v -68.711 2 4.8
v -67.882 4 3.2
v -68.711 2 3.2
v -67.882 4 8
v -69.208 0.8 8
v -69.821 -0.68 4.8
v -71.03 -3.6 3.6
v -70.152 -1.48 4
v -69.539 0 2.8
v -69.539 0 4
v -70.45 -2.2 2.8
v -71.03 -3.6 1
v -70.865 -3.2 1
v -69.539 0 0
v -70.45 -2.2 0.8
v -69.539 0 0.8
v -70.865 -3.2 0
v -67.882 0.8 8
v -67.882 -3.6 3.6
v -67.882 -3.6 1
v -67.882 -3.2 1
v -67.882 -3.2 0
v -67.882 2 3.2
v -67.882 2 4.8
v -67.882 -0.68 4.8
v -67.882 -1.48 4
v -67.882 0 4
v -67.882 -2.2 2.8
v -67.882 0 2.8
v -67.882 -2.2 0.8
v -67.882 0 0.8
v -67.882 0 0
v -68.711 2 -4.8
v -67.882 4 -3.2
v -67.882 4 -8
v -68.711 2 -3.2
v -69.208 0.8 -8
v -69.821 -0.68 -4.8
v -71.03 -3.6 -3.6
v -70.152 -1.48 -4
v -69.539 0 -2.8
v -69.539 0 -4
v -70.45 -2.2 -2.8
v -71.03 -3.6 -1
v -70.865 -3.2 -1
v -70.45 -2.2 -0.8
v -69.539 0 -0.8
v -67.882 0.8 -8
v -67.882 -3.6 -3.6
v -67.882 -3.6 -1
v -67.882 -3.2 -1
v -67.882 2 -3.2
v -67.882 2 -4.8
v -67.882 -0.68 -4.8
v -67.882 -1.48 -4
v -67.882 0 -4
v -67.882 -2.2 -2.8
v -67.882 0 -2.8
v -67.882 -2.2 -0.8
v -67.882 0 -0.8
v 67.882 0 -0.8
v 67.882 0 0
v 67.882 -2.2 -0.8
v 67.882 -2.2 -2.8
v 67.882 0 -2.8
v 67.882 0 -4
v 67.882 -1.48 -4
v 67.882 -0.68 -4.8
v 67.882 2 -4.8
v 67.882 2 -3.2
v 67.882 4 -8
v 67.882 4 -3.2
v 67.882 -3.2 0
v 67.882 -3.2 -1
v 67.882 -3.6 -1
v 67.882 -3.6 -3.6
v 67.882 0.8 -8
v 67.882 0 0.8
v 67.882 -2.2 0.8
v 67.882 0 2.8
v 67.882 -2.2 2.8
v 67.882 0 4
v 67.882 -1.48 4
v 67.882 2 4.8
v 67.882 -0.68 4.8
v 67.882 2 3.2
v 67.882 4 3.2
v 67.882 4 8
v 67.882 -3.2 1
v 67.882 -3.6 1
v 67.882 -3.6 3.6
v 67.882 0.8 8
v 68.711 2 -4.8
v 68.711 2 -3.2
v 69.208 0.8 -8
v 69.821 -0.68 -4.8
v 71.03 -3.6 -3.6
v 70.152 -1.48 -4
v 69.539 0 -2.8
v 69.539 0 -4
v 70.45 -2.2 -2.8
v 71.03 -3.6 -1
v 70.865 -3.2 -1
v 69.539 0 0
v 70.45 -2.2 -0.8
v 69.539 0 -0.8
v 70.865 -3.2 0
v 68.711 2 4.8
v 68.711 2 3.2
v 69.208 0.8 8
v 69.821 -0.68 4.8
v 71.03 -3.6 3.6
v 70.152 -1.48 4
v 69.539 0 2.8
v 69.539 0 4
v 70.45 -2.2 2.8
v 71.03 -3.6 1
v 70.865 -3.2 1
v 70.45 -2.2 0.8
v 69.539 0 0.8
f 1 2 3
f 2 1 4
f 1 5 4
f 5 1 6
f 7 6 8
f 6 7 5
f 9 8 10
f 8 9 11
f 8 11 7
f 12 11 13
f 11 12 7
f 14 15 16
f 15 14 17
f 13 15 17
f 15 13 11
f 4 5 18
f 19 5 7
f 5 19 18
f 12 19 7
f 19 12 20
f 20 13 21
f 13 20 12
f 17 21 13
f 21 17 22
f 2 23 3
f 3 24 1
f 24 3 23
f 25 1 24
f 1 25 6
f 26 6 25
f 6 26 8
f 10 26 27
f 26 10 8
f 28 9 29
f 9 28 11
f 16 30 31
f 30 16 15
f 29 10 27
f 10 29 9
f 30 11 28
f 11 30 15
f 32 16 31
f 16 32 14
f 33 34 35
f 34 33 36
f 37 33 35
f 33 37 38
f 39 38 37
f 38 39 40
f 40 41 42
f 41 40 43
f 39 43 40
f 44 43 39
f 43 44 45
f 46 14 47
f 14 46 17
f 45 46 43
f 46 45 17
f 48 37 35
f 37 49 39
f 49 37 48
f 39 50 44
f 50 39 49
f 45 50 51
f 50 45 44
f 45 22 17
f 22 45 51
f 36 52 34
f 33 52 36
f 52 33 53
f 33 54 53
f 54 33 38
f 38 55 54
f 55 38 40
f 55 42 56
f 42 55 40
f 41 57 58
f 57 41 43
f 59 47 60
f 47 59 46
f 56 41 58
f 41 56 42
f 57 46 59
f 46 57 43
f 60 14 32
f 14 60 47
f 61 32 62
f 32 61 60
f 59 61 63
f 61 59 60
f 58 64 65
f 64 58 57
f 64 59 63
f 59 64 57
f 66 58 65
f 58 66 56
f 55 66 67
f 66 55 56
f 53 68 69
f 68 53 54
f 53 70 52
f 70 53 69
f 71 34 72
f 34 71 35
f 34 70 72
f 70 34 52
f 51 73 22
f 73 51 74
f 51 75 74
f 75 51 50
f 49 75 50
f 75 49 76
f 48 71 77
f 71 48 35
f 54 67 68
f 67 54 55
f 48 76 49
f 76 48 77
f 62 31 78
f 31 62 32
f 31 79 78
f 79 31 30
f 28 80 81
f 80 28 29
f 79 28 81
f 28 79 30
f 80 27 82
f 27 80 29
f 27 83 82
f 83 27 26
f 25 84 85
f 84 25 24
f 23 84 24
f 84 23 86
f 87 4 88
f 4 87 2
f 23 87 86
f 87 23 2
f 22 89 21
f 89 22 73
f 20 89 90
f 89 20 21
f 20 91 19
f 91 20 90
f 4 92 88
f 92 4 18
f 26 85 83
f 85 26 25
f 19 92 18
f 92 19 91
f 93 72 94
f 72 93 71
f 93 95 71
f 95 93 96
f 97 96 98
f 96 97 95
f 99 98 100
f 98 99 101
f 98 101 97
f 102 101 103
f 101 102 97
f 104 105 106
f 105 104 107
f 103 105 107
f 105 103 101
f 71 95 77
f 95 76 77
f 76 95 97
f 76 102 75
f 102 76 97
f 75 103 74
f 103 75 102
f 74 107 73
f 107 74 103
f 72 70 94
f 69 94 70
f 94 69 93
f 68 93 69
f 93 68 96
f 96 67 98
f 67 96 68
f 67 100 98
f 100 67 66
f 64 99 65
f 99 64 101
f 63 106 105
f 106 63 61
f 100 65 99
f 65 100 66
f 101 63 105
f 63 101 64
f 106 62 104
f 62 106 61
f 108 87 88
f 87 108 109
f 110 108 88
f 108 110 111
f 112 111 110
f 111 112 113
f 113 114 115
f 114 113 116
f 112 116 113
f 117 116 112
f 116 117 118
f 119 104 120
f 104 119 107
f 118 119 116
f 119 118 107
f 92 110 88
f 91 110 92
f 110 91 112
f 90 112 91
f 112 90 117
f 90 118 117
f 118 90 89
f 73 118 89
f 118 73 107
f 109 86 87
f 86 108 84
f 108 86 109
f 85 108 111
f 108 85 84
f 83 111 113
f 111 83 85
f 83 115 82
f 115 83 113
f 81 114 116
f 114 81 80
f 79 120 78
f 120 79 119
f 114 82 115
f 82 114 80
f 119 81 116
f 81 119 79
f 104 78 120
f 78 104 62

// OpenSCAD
// file: ../p/rect2p.scad
use <../lib.scad>
function ldraw_lib__rect2p() = [
// 0 Rectangle with 2 Parallel Edges
// 0 Name: rect2p.dat
// 0 Author: Donald Sutter [technog]
// 0 !LDRAW_ORG Primitive UPDATE 2010-01
// 0 !LICENSE Licensed under CC BY 2.0 and CC BY 4.0 : see CAreadme.txt
// 
// 0 BFC CERTIFY CCW
  [0,"BFC","CERTIFY"],
  [0,"BFC","CCW"],
// 
// 0 !HISTORY 2003-08-01 [PTadmin] Official Update 2003-02
// 0 !HISTORY 2007-06-24 [PTadmin] Header formatted for Contributor Agreement
// 0 !HISTORY 2008-07-01 [PTadmin] Official Update 2008-01
// 0 !HISTORY 2010-01-17 [mikeheide] changed winding to CCW
// 0 !HISTORY 2010-04-05 [PTadmin] Official Update 2010-01
// 
// 
// 2 24 1 0 1 -1 0 1
  [2,24,1,0,1,-1,0,1],
// 2 24 -1 0 -1 1 0 -1
  [2,24,-1,0,-1,1,0,-1],
// 4 16 -1 0 1 -1 0 -1 1 0 -1 1 0 1
  [4,16,-1,0,1,-1,0,-1,1,0,-1,1,0,1],
// 0
];
module ldraw_lib__rect2p(step=0, col=false, unit=2/5, alt=false, line=0.2, solid=!$preview)
    makepoly(ldraw_lib__rect2p(), step=step, col=col, unit=unit, alt=alt, line=line, solid=solid);
ldraw_lib__rect2p(line=0.2);
// file: ../p/rect1.scad
use <../lib.scad>
function ldraw_lib__rect1() = [
// 0 Rectangle with 1 Edge
// 0 Name: rect1.dat
// 0 Author: Chris Dee [cwdee]
// 0 !LDRAW_ORG Primitive UPDATE 2010-01
// 0 !LICENSE Licensed under CC BY 2.0 and CC BY 4.0 : see CAreadme.txt
// 
// 0 BFC CERTIFY CCW
  [0,"BFC","CERTIFY"],
  [0,"BFC","CCW"],
// 
// 0 !HISTORY 2003-12-19 [PTadmin] Official Update 2003-03
// 0 !HISTORY 2007-06-24 [PTadmin] Header formatted for Contributor Agreement
// 0 !HISTORY 2008-07-01 [PTadmin] Official Update 2008-01
// 0 !HISTORY 2010-01-17 [mikeheide] changed winding to CCW
// 0 !HISTORY 2010-04-05 [PTadmin] Official Update 2010-01
// 
// 
// 2 24 1 0 -1 1 0 1
  [2,24,1,0,-1,1,0,1],
// 4 16 -1 0 1 -1 0 -1 1 0 -1 1 0 1
  [4,16,-1,0,1,-1,0,-1,1,0,-1,1,0,1],
// 0
];
module ldraw_lib__rect1(step=0, col=false, unit=2/5, alt=false, line=0.2, solid=!$preview)
    makepoly(ldraw_lib__rect1(), step=step, col=col, unit=unit, alt=alt, line=line, solid=solid);
ldraw_lib__rect1(line=0.2);
// file: ../p/box2-9p.scad
use <../lib.scad>
function ldraw_lib__box2_9p() = [
// 0 Box with 2 Faces with 3 Parallel Edges
// 0 Name: box2-9p.dat
// 0 Author: Ronald Vallenduuk [Duq]
// 0 !LDRAW_ORG Primitive UPDATE 2013-02
// 0 !LICENSE Licensed under CC BY 2.0 and CC BY 4.0 : see CAreadme.txt
// 
// 0 BFC CERTIFY CCW
  [0,"BFC","CERTIFY"],
  [0,"BFC","CCW"],
// 
// 0 !HISTORY 2013-12-23 [PTadmin] Official Update 2013-02
// 
// 
// 2 24 1 1 1 -1 1 1
  [2,24,1,1,1,-1,1,1],
// 2 24 1 -1 1 -1 -1 1
  [2,24,1,-1,1,-1,-1,1],
// 2 24 1 1 -1 -1 1 -1
  [2,24,1,1,-1,-1,1,-1],
// 4 16 1 1 1 1 1 -1 -1 1 -1 -1 1 1
  [4,16,1,1,1,1,1,-1,-1,1,-1,-1,1,1],
// 4 16 1 1 1 -1 1 1 -1 -1 1 1 -1 1
  [4,16,1,1,1,-1,1,1,-1,-1,1,1,-1,1],
];
module ldraw_lib__box2_9p(step=0, col=false, unit=2/5, alt=false, line=0.2, solid=!$preview)
    makepoly(ldraw_lib__box2_9p(), step=step, col=col, unit=unit, alt=alt, line=line, solid=solid);
ldraw_lib__box2_9p(line=0.2);
// file: ../p/box2-11.scad
use <../lib.scad>
function ldraw_lib__box2_11() = [
// 0 Box with 2 Faces without 11 Edges
// 0 Name: box2-11.dat
// 0 Author: Steffen [Steffen]
// 0 !LDRAW_ORG Primitive UPDATE 2005-01
// 0 !LICENSE Licensed under CC BY 2.0 and CC BY 4.0 : see CAreadme.txt
// 
// 0 BFC CERTIFY CCW
  [0,"BFC","CERTIFY"],
  [0,"BFC","CCW"],
// 
// 0 !HISTORY 2005-12-28 [PTadmin] Official Update 2005-01
// 0 !HISTORY 2007-06-24 [PTadmin] Header formatted for Contributor Agreement
// 0 !HISTORY 2008-07-01 [PTadmin] Official Update 2008-01
// 
// 
// 2 24 1 1 1 -1 1 1
  [2,24,1,1,1,-1,1,1],
// 4 16 1 1 1 1 1 -1 -1 1 -1 -1 1 1
  [4,16,1,1,1,1,1,-1,-1,1,-1,-1,1,1],
// 4 16 1 1 1 -1 1 1 -1 -1 1 1 -1 1
  [4,16,1,1,1,-1,1,1,-1,-1,1,1,-1,1],
// 0
];
module ldraw_lib__box2_11(step=0, col=false, unit=2/5, alt=false, line=0.2, solid=!$preview)
    makepoly(ldraw_lib__box2_11(), step=step, col=col, unit=unit, alt=alt, line=line, solid=solid);
ldraw_lib__box2_11(line=0.2);
// file: ../p/rect3.scad
use <../lib.scad>
function ldraw_lib__rect3() = [
// 0 Rectangle with 3 Edges
// 0 Name: rect3.dat
// 0 Author: Mark Kennedy [mkennedy]
// 0 !LDRAW_ORG Primitive UPDATE 2010-01
// 0 !LICENSE Licensed under CC BY 2.0 and CC BY 4.0 : see CAreadme.txt
// 
// 0 BFC CERTIFY CCW
  [0,"BFC","CERTIFY"],
  [0,"BFC","CCW"],
// 
// 0 !HISTORY 2003-08-01 [PTadmin] Official Update 2003-02
// 0 !HISTORY 2007-06-24 [PTadmin] Header formatted for Contributor Agreement
// 0 !HISTORY 2008-07-01 [PTadmin] Official Update 2008-01
// 0 !HISTORY 2010-01-17 [mikeheide] Change winding to CCW
// 0 !HISTORY 2010-04-05 [PTadmin] Official Update 2010-01
// 
// 
// 2 24 1 0 1 -1 0 1
  [2,24,1,0,1,-1,0,1],
// 2 24 1 0 1 1 0 -1
  [2,24,1,0,1,1,0,-1],
// 2 24 -1 0 1 -1 0 -1
  [2,24,-1,0,1,-1,0,-1],
// 4 16 -1 0 1 -1 0 -1 1 0 -1 1 0 1
  [4,16,-1,0,1,-1,0,-1,1,0,-1,1,0,1],
// 0 //
];
module ldraw_lib__rect3(step=0, col=false, unit=2/5, alt=false, line=0.2, solid=!$preview)
    makepoly(ldraw_lib__rect3(), step=step, col=col, unit=unit, alt=alt, line=line, solid=solid);
ldraw_lib__rect3(line=0.2);
// file: ../p/rect2a.scad
use <../lib.scad>
function ldraw_lib__rect2a() = [
// 0 Rectangle with 2 Adjacent Edges
// 0 Name: rect2a.dat
// 0 Author: Chris Dee [cwdee]
// 0 !LDRAW_ORG Primitive UPDATE 2010-01
// 0 !LICENSE Licensed under CC BY 2.0 and CC BY 4.0 : see CAreadme.txt
// 
// 0 BFC CERTIFY CCW
  [0,"BFC","CERTIFY"],
  [0,"BFC","CCW"],
// 
// 0 !HISTORY 2003-12-19 [PTadmin] Official Update 2003-03
// 0 !HISTORY 2007-06-24 [PTadmin] Header formatted for Contributor Agreement
// 0 !HISTORY 2008-07-01 [PTadmin] Official Update 2008-01
// 0 !HISTORY 2010-01-17 [mikeheide] changed winding to CCW
// 0 !HISTORY 2010-04-05 [PTadmin] Official Update 2010-01
// 
// 
// 2 24 1 0 1 -1 0 1
  [2,24,1,0,1,-1,0,1],
// 2 24 1 0 -1 1 0 1
  [2,24,1,0,-1,1,0,1],
// 4 16 -1 0 1 -1 0 -1 1 0 -1 1 0 1
  [4,16,-1,0,1,-1,0,-1,1,0,-1,1,0,1],
// 0
];
module ldraw_lib__rect2a(step=0, col=false, unit=2/5, alt=false, line=0.2, solid=!$preview)
    makepoly(ldraw_lib__rect2a(), step=step, col=col, unit=unit, alt=alt, line=line, solid=solid);
ldraw_lib__rect2a(line=0.2);
// file: s/48202s02.scad
use <../../lib.scad>
use <../../p/box2-11.scad>
use <../../p/box2-9p.scad>
use <../../p/rect1.scad>
use <../../p/rect2p.scad>
function ldraw_lib__s__48202s02() = [
// 0 ~Technic Bumper Section
// 0 Name: s\48202s02.dat
// 0 Author: Marc Giraudet [Mad_Marc]
// 0 !LDRAW_ORG Subpart UPDATE 2020-01
// 0 !LICENSE Licensed under CC BY 2.0 and CC BY 4.0 : see CAreadme.txt
// 
// 0 BFC CERTIFY CCW
  [0,"BFC","CERTIFY"],
  [0,"BFC","CCW"],
// 
// 0 !HISTORY 2020-06-28 [PTadmin] Official Update 2020-01
// 
// 
// 1 16 1 -1 -2.75 1 0 0 0 0 -1 0 2.75 0 box2-11.dat
  [1,16,1,-1,-2.75,1,0,0,0,0,-1,0,2.75,0, ldraw_lib__box2_11()],
// 0 BFC INVERTNEXT
  [0,"BFC","INVERTNEXT"],
// 1 16 1 -4.5 -2.75 1 0 0 0 -2.5 0 0 0 -2.75 box2-9p.dat
  [1,16,1,-4.5,-2.75,1,0,0,0,-2.5,0,0,0,-2.75, ldraw_lib__box2_9p()],
// 1 16 1 -8.5 -1.85 1 0 0 0 0 -1.5 0 1.85 0 box2-11.dat
  [1,16,1,-8.5,-1.85,1,0,0,0,0,-1.5,0,1.85,0, ldraw_lib__box2_11()],
// 0 BFC INVERTNEXT
  [0,"BFC","INVERTNEXT"],
// 1 16 1 -10 1.65 -1 0 0 0 -2 0 0 0 3.35 box2-9p.dat
  [1,16,1,-10,1.65,-1,0,0,0,-2,0,0,0,3.35, ldraw_lib__box2_9p()],
// 1 16 1 -14 7.5 -1 0 0 0 0 6 0 2.5 0 box2-11.dat
  [1,16,1,-14,7.5,-1,0,0,0,0,6,0,2.5,0, ldraw_lib__box2_11()],
// 0 BFC INVERTNEXT
  [0,"BFC","INVERTNEXT"],
// 1 16 1 -1.25 -8.5 1 0 0 0 0 -1.25 0 0.5 0 box2-11.dat
  [1,16,1,-1.25,-8.5,1,0,0,0,0,-1.25,0,0.5,0, ldraw_lib__box2_11()],
// 1 16 1 -5.75 -9 1 0 0 0 0 -3.25 0 1 0 rect2p.dat
  [1,16,1,-5.75,-9,1,0,0,0,0,-3.25,0,1,0, ldraw_lib__rect2p()],
// 1 16 1 -20 6 1 0 0 0 1 0 0 0 4 rect2p.dat
  [1,16,1,-20,6,1,0,0,0,1,0,0,0,4, ldraw_lib__rect2p()],
// 1 16 1 -11 -2.7 0 0 -1 0.9998 -0.7071 0 -0.9998 -0.7071 0 rect1.dat
  [1,16,1,-11,-2.7,0,0,-1,0.9998,-0.7071,0,-0.9998,-0.7071,0, ldraw_lib__rect1()],
// 4 16 0 -20 2 0 -9 -9 2 -9 -9 2 -20 2
  [4,16,0,-20,2,0,-9,-9,2,-9,-9,2,-20,2],
];
module ldraw_lib__s__48202s02(step=0, col=false, unit=2/5, alt=false, line=0.2, solid=!$preview)
    makepoly(ldraw_lib__s__48202s02(), step=step, col=col, unit=unit, alt=alt, line=line, solid=solid);
ldraw_lib__s__48202s02(line=0.2);
// file: s/48202s01.scad
use <../../lib.scad>
use <../../p/rect2a.scad>
use <../../p/rect3.scad>
function ldraw_lib__s__48202s01() = [
// 0 ~Technic Bumper End
// 0 Name: s\48202s01.dat
// 0 Author: Marc Giraudet [Mad_Marc]
// 0 !LDRAW_ORG Subpart UPDATE 2020-01
// 0 !LICENSE Licensed under CC BY 2.0 and CC BY 4.0 : see CAreadme.txt
// 
// 0 BFC CERTIFY CCW
  [0,"BFC","CERTIFY"],
  [0,"BFC","CCW"],
// 
// 0 !HISTORY 2020-06-28 [PTadmin] Official Update 2020-01
// 
// 
// 4 16 0 -20 10 0 -8 10 -2.071 -8 5 -2.071 -12 5
  [4,16,0,-20,10,0,-8,10,-2.071,-8,5,-2.071,-12,5],
// 4 16 -2.071 -12 5 -4.846 -12 -1.7 -3.314 -20 2 0 -20 10
  [4,16,-2.071,-12,5,-4.846,-12,-1.7,-3.314,-20,2,0,-20,10],
// 4 16 -3.314 -20 2 -4.846 -12 -1.7 -5.675 -10 -3.7 -7.87 -9 -9
  [4,16,-3.314,-20,2,-4.846,-12,-1.7,-5.675,-10,-3.7,-7.87,-9,-9],
// 4 16 -5.675 -10 -3.7 -4.142 -10 0 -4.142 -7 0 -6.42 -7 -5.5
  [4,16,-5.675,-10,-3.7,-4.142,-10,0,-4.142,-7,0,-6.42,-7,-5.5],
// 3 16 -5.675 -10 -3.7 -6.42 -7 -5.5 -7.87 -9 -9
  [3,16,-5.675,-10,-3.7,-6.42,-7,-5.5,-7.87,-9,-9],
// 4 16 -7.87 -9 -9 -6.42 -7 -5.5 -7.456 -2.5 -8 -7.87 -2.5 -9
  [4,16,-7.87,-9,-9,-6.42,-7,-5.5,-7.456,-2.5,-8,-7.87,-2.5,-9],
// 4 16 -4.142 -2 0 -4.142 0 0 -7.456 0 -8 -6.42 -2 -5.5
  [4,16,-4.142,-2,0,-4.142,0,0,-7.456,0,-8,-6.42,-2,-5.5],
// 4 16 -6.42 -7 -5.5 -6.42 -2 -5.5 -7.456 0 -8 -7.456 -2.5 -8
  [4,16,-6.42,-7,-5.5,-6.42,-2,-5.5,-7.456,0,-8,-7.456,-2.5,-8],
// 2 24 0 -20 10 -3.314 -20 2
  [2,24,0,-20,10,-3.314,-20,2],
// 2 24 -3.314 -20 2 -7.87 -9 -9
  [2,24,-3.314,-20,2,-7.87,-9,-9],
// 2 24 -7.87 -2.5 -9 -7.456 -2.5 -8
  [2,24,-7.87,-2.5,-9,-7.456,-2.5,-8],
// 2 24 -4.142 -2 0 -6.42 -2 -5.5
  [2,24,-4.142,-2,0,-6.42,-2,-5.5],
// 2 24 -6.42 -7 -5.5 -4.142 -7 0
  [2,24,-6.42,-7,-5.5,-4.142,-7,0],
// 2 24 -4.142 -10 0 -5.675 -10 -3.7
  [2,24,-4.142,-10,0,-5.675,-10,-3.7],
// 2 24 -5.675 -10 -3.7 -4.846 -12 -1.7
  [2,24,-5.675,-10,-3.7,-4.846,-12,-1.7],
// 2 24 -4.846 -12 -1.7 -2.071 -12 5
  [2,24,-4.846,-12,-1.7,-2.071,-12,5],
// 2 24 0 -8 10 -2.071 -8 5
  [2,24,0,-8,10,-2.071,-8,5],
// 2 24 0 -8 10 0 -20 10
  [2,24,0,-8,10,0,-20,10],
// 3 16 0 -20 10 -3.314 -20 2 0 -20 2
  [3,16,0,-20,10,-3.314,-20,2,0,-20,2],
// 4 16 0 -20 2 -3.314 -20 2 -7.87 -9 -9 0 -9 -9
  [4,16,0,-20,2,-3.314,-20,2,-7.87,-9,-9,0,-9,-9],
// 2 24 -3.314 -20 2 0 -20 2
  [2,24,-3.314,-20,2,0,-20,2],
// 1 16 -3.935 -5.75 -9 0 0 -3.935 -3.25 0 0 0 1 0 rect3.dat
  [1,16,-3.935,-5.75,-9,0,0,-3.935,-3.25,0,0,0,1,0, ldraw_lib__rect3()],
// 4 16 -7.456 -2.5 -8 0 -2.5 -8 0 -2.5 -9 -7.87 -2.5 -9
  [4,16,-7.456,-2.5,-8,0,-2.5,-8,0,-2.5,-9,-7.87,-2.5,-9],
// 1 16 -3.728 -1.25 -8 0 0 -3.728 -1.25 0 0 0 1 0 rect2a.dat
  [1,16,-3.728,-1.25,-8,0,0,-3.728,-1.25,0,0,0,1,0, ldraw_lib__rect2a()],
// 3 16 0 -8 10 0 -8 5 -2.071 -8 5
  [3,16,0,-8,10,0,-8,5,-2.071,-8,5],
// 1 16 -1.036 -10 5 0 0 -1.036 -2 0 0 0 1 0 rect3.dat
  [1,16,-1.036,-10,5,0,0,-1.036,-2,0,0,0,1,0, ldraw_lib__rect3()],
// 4 16 -2.071 -12 5 0 -12 5 0 -12 -1.7 -4.846 -12 -1.7
  [4,16,-2.071,-12,5,0,-12,5,0,-12,-1.7,-4.846,-12,-1.7],
// 4 16 -4.846 -12 -1.7 0 -12 -1.7 0 -10 -3.7 -5.675 -10 -3.7
  [4,16,-4.846,-12,-1.7,0,-12,-1.7,0,-10,-3.7,-5.675,-10,-3.7],
// 4 16 -5.675 -10 -3.7 0 -10 -3.7 0 -10 0 -4.142 -10 0
  [4,16,-5.675,-10,-3.7,0,-10,-3.7,0,-10,0,-4.142,-10,0],
// 4 16 -4.142 -7 0 0 -7 0 0 -7 -5.5 -6.42 -7 -5.5
  [4,16,-4.142,-7,0,0,-7,0,0,-7,-5.5,-6.42,-7,-5.5],
// 4 16 -6.42 -2 -5.5 0 -2 -5.5 0 -2 0 -4.142 -2 0
  [4,16,-6.42,-2,-5.5,0,-2,-5.5,0,-2,0,-4.142,-2,0],
// 1 16 -2.071 -8.5 0 0 0 -2.071 1.5 0 0 0 -1 0 rect3.dat
  [1,16,-2.071,-8.5,0,0,0,-2.071,1.5,0,0,0,-1,0, ldraw_lib__rect3()],
// 1 16 -3.21 -4.5 -5.5 0 0 -3.21 2.5 0 0 0 -1 0 rect3.dat
  [1,16,-3.21,-4.5,-5.5,0,0,-3.21,2.5,0,0,0,-1,0, ldraw_lib__rect3()],
// 1 16 -2.071 -1 0 -2.071 0 0 0 0 -1 0 -1 0 rect2a.dat
  [1,16,-2.071,-1,0,-2.071,0,0,0,0,-1,0,-1,0, ldraw_lib__rect2a()],
// 2 24 -4.846 -12 -1.7 0 -12 -1.7
  [2,24,-4.846,-12,-1.7,0,-12,-1.7],
// 2 24 -5.675 -10 -3.7 0 -10 -3.7
  [2,24,-5.675,-10,-3.7,0,-10,-3.7],
];
module ldraw_lib__s__48202s01(step=0, col=false, unit=2/5, alt=false, line=0.2, solid=!$preview)
    makepoly(ldraw_lib__s__48202s01(), step=step, col=col, unit=unit, alt=alt, line=line, solid=solid);
ldraw_lib__s__48202s01(line=0.2);
// main file
use <../lib.scad>
use <s/48202s01.scad>
use <s/48202s02.scad>
function ldraw_lib__48202() = [
// 0 Technic Bumper  2 x 18
// 0 Name: 48202.dat
// 0 Author: Marc Giraudet [Mad_Marc]
// 0 !LDRAW_ORG Part UPDATE 2020-01
// 0 !LICENSE Licensed under CC BY 2.0 and CC BY 4.0 : see CAreadme.txt
// 
// 0 BFC CERTIFY CCW
  [0,"BFC","CERTIFY"],
  [0,"BFC","CCW"],
// 
// 0 !HISTORY 2020-06-28 [PTadmin] Official Update 2020-01
// 
// 
// 1 16 -169.706 0 0 1 0 0 0 1 0 0 0 1 s\48202s01.dat
  [1,16,-169.706,0,0,1,0,0,0,1,0,0,0,1, ldraw_lib__s__48202s01()],
// 0 // INVERTNEXT
// 1 16 -169.706 0 0 1 0 0 0 -1 0 0 0 1 s\48202s01.dat
  [1,16,-169.706,0,0,1,0,0,0,-1,0,0,0,1, ldraw_lib__s__48202s01()],
// 1 16 -169.706 0 0 169.706 0 0 0 -1 0 0 0 1 s\48202s02.dat
  [1,16,-169.706,0,0,169.706,0,0,0,-1,0,0,0,1, ldraw_lib__s__48202s02()],
// 1 16 -169.706 0 0 169.706 0 0 0 1 0 0 0 1 s\48202s02.dat
  [1,16,-169.706,0,0,169.706,0,0,0,1,0,0,0,1, ldraw_lib__s__48202s02()],
// 1 16 169.706 0 0 -1 0 0 0 -1 0 0 0 1 s\48202s01.dat
  [1,16,169.706,0,0,-1,0,0,0,-1,0,0,0,1, ldraw_lib__s__48202s01()],
// 0 // INVERTNEXT
// 1 16 169.706 0 0 -1 0 0 0 1 0 0 0 1 s\48202s01.dat
  [1,16,169.706,0,0,-1,0,0,0,1,0,0,0,1, ldraw_lib__s__48202s01()],
];
module ldraw_lib__48202(step=0, col=false, unit=2/5, alt=false, line=0.2, solid=!$preview)
    makepoly(ldraw_lib__48202(), step=step, col=col, unit=unit, alt=alt, line=line, solid=solid);
ldraw_lib__48202(line=0.2);
